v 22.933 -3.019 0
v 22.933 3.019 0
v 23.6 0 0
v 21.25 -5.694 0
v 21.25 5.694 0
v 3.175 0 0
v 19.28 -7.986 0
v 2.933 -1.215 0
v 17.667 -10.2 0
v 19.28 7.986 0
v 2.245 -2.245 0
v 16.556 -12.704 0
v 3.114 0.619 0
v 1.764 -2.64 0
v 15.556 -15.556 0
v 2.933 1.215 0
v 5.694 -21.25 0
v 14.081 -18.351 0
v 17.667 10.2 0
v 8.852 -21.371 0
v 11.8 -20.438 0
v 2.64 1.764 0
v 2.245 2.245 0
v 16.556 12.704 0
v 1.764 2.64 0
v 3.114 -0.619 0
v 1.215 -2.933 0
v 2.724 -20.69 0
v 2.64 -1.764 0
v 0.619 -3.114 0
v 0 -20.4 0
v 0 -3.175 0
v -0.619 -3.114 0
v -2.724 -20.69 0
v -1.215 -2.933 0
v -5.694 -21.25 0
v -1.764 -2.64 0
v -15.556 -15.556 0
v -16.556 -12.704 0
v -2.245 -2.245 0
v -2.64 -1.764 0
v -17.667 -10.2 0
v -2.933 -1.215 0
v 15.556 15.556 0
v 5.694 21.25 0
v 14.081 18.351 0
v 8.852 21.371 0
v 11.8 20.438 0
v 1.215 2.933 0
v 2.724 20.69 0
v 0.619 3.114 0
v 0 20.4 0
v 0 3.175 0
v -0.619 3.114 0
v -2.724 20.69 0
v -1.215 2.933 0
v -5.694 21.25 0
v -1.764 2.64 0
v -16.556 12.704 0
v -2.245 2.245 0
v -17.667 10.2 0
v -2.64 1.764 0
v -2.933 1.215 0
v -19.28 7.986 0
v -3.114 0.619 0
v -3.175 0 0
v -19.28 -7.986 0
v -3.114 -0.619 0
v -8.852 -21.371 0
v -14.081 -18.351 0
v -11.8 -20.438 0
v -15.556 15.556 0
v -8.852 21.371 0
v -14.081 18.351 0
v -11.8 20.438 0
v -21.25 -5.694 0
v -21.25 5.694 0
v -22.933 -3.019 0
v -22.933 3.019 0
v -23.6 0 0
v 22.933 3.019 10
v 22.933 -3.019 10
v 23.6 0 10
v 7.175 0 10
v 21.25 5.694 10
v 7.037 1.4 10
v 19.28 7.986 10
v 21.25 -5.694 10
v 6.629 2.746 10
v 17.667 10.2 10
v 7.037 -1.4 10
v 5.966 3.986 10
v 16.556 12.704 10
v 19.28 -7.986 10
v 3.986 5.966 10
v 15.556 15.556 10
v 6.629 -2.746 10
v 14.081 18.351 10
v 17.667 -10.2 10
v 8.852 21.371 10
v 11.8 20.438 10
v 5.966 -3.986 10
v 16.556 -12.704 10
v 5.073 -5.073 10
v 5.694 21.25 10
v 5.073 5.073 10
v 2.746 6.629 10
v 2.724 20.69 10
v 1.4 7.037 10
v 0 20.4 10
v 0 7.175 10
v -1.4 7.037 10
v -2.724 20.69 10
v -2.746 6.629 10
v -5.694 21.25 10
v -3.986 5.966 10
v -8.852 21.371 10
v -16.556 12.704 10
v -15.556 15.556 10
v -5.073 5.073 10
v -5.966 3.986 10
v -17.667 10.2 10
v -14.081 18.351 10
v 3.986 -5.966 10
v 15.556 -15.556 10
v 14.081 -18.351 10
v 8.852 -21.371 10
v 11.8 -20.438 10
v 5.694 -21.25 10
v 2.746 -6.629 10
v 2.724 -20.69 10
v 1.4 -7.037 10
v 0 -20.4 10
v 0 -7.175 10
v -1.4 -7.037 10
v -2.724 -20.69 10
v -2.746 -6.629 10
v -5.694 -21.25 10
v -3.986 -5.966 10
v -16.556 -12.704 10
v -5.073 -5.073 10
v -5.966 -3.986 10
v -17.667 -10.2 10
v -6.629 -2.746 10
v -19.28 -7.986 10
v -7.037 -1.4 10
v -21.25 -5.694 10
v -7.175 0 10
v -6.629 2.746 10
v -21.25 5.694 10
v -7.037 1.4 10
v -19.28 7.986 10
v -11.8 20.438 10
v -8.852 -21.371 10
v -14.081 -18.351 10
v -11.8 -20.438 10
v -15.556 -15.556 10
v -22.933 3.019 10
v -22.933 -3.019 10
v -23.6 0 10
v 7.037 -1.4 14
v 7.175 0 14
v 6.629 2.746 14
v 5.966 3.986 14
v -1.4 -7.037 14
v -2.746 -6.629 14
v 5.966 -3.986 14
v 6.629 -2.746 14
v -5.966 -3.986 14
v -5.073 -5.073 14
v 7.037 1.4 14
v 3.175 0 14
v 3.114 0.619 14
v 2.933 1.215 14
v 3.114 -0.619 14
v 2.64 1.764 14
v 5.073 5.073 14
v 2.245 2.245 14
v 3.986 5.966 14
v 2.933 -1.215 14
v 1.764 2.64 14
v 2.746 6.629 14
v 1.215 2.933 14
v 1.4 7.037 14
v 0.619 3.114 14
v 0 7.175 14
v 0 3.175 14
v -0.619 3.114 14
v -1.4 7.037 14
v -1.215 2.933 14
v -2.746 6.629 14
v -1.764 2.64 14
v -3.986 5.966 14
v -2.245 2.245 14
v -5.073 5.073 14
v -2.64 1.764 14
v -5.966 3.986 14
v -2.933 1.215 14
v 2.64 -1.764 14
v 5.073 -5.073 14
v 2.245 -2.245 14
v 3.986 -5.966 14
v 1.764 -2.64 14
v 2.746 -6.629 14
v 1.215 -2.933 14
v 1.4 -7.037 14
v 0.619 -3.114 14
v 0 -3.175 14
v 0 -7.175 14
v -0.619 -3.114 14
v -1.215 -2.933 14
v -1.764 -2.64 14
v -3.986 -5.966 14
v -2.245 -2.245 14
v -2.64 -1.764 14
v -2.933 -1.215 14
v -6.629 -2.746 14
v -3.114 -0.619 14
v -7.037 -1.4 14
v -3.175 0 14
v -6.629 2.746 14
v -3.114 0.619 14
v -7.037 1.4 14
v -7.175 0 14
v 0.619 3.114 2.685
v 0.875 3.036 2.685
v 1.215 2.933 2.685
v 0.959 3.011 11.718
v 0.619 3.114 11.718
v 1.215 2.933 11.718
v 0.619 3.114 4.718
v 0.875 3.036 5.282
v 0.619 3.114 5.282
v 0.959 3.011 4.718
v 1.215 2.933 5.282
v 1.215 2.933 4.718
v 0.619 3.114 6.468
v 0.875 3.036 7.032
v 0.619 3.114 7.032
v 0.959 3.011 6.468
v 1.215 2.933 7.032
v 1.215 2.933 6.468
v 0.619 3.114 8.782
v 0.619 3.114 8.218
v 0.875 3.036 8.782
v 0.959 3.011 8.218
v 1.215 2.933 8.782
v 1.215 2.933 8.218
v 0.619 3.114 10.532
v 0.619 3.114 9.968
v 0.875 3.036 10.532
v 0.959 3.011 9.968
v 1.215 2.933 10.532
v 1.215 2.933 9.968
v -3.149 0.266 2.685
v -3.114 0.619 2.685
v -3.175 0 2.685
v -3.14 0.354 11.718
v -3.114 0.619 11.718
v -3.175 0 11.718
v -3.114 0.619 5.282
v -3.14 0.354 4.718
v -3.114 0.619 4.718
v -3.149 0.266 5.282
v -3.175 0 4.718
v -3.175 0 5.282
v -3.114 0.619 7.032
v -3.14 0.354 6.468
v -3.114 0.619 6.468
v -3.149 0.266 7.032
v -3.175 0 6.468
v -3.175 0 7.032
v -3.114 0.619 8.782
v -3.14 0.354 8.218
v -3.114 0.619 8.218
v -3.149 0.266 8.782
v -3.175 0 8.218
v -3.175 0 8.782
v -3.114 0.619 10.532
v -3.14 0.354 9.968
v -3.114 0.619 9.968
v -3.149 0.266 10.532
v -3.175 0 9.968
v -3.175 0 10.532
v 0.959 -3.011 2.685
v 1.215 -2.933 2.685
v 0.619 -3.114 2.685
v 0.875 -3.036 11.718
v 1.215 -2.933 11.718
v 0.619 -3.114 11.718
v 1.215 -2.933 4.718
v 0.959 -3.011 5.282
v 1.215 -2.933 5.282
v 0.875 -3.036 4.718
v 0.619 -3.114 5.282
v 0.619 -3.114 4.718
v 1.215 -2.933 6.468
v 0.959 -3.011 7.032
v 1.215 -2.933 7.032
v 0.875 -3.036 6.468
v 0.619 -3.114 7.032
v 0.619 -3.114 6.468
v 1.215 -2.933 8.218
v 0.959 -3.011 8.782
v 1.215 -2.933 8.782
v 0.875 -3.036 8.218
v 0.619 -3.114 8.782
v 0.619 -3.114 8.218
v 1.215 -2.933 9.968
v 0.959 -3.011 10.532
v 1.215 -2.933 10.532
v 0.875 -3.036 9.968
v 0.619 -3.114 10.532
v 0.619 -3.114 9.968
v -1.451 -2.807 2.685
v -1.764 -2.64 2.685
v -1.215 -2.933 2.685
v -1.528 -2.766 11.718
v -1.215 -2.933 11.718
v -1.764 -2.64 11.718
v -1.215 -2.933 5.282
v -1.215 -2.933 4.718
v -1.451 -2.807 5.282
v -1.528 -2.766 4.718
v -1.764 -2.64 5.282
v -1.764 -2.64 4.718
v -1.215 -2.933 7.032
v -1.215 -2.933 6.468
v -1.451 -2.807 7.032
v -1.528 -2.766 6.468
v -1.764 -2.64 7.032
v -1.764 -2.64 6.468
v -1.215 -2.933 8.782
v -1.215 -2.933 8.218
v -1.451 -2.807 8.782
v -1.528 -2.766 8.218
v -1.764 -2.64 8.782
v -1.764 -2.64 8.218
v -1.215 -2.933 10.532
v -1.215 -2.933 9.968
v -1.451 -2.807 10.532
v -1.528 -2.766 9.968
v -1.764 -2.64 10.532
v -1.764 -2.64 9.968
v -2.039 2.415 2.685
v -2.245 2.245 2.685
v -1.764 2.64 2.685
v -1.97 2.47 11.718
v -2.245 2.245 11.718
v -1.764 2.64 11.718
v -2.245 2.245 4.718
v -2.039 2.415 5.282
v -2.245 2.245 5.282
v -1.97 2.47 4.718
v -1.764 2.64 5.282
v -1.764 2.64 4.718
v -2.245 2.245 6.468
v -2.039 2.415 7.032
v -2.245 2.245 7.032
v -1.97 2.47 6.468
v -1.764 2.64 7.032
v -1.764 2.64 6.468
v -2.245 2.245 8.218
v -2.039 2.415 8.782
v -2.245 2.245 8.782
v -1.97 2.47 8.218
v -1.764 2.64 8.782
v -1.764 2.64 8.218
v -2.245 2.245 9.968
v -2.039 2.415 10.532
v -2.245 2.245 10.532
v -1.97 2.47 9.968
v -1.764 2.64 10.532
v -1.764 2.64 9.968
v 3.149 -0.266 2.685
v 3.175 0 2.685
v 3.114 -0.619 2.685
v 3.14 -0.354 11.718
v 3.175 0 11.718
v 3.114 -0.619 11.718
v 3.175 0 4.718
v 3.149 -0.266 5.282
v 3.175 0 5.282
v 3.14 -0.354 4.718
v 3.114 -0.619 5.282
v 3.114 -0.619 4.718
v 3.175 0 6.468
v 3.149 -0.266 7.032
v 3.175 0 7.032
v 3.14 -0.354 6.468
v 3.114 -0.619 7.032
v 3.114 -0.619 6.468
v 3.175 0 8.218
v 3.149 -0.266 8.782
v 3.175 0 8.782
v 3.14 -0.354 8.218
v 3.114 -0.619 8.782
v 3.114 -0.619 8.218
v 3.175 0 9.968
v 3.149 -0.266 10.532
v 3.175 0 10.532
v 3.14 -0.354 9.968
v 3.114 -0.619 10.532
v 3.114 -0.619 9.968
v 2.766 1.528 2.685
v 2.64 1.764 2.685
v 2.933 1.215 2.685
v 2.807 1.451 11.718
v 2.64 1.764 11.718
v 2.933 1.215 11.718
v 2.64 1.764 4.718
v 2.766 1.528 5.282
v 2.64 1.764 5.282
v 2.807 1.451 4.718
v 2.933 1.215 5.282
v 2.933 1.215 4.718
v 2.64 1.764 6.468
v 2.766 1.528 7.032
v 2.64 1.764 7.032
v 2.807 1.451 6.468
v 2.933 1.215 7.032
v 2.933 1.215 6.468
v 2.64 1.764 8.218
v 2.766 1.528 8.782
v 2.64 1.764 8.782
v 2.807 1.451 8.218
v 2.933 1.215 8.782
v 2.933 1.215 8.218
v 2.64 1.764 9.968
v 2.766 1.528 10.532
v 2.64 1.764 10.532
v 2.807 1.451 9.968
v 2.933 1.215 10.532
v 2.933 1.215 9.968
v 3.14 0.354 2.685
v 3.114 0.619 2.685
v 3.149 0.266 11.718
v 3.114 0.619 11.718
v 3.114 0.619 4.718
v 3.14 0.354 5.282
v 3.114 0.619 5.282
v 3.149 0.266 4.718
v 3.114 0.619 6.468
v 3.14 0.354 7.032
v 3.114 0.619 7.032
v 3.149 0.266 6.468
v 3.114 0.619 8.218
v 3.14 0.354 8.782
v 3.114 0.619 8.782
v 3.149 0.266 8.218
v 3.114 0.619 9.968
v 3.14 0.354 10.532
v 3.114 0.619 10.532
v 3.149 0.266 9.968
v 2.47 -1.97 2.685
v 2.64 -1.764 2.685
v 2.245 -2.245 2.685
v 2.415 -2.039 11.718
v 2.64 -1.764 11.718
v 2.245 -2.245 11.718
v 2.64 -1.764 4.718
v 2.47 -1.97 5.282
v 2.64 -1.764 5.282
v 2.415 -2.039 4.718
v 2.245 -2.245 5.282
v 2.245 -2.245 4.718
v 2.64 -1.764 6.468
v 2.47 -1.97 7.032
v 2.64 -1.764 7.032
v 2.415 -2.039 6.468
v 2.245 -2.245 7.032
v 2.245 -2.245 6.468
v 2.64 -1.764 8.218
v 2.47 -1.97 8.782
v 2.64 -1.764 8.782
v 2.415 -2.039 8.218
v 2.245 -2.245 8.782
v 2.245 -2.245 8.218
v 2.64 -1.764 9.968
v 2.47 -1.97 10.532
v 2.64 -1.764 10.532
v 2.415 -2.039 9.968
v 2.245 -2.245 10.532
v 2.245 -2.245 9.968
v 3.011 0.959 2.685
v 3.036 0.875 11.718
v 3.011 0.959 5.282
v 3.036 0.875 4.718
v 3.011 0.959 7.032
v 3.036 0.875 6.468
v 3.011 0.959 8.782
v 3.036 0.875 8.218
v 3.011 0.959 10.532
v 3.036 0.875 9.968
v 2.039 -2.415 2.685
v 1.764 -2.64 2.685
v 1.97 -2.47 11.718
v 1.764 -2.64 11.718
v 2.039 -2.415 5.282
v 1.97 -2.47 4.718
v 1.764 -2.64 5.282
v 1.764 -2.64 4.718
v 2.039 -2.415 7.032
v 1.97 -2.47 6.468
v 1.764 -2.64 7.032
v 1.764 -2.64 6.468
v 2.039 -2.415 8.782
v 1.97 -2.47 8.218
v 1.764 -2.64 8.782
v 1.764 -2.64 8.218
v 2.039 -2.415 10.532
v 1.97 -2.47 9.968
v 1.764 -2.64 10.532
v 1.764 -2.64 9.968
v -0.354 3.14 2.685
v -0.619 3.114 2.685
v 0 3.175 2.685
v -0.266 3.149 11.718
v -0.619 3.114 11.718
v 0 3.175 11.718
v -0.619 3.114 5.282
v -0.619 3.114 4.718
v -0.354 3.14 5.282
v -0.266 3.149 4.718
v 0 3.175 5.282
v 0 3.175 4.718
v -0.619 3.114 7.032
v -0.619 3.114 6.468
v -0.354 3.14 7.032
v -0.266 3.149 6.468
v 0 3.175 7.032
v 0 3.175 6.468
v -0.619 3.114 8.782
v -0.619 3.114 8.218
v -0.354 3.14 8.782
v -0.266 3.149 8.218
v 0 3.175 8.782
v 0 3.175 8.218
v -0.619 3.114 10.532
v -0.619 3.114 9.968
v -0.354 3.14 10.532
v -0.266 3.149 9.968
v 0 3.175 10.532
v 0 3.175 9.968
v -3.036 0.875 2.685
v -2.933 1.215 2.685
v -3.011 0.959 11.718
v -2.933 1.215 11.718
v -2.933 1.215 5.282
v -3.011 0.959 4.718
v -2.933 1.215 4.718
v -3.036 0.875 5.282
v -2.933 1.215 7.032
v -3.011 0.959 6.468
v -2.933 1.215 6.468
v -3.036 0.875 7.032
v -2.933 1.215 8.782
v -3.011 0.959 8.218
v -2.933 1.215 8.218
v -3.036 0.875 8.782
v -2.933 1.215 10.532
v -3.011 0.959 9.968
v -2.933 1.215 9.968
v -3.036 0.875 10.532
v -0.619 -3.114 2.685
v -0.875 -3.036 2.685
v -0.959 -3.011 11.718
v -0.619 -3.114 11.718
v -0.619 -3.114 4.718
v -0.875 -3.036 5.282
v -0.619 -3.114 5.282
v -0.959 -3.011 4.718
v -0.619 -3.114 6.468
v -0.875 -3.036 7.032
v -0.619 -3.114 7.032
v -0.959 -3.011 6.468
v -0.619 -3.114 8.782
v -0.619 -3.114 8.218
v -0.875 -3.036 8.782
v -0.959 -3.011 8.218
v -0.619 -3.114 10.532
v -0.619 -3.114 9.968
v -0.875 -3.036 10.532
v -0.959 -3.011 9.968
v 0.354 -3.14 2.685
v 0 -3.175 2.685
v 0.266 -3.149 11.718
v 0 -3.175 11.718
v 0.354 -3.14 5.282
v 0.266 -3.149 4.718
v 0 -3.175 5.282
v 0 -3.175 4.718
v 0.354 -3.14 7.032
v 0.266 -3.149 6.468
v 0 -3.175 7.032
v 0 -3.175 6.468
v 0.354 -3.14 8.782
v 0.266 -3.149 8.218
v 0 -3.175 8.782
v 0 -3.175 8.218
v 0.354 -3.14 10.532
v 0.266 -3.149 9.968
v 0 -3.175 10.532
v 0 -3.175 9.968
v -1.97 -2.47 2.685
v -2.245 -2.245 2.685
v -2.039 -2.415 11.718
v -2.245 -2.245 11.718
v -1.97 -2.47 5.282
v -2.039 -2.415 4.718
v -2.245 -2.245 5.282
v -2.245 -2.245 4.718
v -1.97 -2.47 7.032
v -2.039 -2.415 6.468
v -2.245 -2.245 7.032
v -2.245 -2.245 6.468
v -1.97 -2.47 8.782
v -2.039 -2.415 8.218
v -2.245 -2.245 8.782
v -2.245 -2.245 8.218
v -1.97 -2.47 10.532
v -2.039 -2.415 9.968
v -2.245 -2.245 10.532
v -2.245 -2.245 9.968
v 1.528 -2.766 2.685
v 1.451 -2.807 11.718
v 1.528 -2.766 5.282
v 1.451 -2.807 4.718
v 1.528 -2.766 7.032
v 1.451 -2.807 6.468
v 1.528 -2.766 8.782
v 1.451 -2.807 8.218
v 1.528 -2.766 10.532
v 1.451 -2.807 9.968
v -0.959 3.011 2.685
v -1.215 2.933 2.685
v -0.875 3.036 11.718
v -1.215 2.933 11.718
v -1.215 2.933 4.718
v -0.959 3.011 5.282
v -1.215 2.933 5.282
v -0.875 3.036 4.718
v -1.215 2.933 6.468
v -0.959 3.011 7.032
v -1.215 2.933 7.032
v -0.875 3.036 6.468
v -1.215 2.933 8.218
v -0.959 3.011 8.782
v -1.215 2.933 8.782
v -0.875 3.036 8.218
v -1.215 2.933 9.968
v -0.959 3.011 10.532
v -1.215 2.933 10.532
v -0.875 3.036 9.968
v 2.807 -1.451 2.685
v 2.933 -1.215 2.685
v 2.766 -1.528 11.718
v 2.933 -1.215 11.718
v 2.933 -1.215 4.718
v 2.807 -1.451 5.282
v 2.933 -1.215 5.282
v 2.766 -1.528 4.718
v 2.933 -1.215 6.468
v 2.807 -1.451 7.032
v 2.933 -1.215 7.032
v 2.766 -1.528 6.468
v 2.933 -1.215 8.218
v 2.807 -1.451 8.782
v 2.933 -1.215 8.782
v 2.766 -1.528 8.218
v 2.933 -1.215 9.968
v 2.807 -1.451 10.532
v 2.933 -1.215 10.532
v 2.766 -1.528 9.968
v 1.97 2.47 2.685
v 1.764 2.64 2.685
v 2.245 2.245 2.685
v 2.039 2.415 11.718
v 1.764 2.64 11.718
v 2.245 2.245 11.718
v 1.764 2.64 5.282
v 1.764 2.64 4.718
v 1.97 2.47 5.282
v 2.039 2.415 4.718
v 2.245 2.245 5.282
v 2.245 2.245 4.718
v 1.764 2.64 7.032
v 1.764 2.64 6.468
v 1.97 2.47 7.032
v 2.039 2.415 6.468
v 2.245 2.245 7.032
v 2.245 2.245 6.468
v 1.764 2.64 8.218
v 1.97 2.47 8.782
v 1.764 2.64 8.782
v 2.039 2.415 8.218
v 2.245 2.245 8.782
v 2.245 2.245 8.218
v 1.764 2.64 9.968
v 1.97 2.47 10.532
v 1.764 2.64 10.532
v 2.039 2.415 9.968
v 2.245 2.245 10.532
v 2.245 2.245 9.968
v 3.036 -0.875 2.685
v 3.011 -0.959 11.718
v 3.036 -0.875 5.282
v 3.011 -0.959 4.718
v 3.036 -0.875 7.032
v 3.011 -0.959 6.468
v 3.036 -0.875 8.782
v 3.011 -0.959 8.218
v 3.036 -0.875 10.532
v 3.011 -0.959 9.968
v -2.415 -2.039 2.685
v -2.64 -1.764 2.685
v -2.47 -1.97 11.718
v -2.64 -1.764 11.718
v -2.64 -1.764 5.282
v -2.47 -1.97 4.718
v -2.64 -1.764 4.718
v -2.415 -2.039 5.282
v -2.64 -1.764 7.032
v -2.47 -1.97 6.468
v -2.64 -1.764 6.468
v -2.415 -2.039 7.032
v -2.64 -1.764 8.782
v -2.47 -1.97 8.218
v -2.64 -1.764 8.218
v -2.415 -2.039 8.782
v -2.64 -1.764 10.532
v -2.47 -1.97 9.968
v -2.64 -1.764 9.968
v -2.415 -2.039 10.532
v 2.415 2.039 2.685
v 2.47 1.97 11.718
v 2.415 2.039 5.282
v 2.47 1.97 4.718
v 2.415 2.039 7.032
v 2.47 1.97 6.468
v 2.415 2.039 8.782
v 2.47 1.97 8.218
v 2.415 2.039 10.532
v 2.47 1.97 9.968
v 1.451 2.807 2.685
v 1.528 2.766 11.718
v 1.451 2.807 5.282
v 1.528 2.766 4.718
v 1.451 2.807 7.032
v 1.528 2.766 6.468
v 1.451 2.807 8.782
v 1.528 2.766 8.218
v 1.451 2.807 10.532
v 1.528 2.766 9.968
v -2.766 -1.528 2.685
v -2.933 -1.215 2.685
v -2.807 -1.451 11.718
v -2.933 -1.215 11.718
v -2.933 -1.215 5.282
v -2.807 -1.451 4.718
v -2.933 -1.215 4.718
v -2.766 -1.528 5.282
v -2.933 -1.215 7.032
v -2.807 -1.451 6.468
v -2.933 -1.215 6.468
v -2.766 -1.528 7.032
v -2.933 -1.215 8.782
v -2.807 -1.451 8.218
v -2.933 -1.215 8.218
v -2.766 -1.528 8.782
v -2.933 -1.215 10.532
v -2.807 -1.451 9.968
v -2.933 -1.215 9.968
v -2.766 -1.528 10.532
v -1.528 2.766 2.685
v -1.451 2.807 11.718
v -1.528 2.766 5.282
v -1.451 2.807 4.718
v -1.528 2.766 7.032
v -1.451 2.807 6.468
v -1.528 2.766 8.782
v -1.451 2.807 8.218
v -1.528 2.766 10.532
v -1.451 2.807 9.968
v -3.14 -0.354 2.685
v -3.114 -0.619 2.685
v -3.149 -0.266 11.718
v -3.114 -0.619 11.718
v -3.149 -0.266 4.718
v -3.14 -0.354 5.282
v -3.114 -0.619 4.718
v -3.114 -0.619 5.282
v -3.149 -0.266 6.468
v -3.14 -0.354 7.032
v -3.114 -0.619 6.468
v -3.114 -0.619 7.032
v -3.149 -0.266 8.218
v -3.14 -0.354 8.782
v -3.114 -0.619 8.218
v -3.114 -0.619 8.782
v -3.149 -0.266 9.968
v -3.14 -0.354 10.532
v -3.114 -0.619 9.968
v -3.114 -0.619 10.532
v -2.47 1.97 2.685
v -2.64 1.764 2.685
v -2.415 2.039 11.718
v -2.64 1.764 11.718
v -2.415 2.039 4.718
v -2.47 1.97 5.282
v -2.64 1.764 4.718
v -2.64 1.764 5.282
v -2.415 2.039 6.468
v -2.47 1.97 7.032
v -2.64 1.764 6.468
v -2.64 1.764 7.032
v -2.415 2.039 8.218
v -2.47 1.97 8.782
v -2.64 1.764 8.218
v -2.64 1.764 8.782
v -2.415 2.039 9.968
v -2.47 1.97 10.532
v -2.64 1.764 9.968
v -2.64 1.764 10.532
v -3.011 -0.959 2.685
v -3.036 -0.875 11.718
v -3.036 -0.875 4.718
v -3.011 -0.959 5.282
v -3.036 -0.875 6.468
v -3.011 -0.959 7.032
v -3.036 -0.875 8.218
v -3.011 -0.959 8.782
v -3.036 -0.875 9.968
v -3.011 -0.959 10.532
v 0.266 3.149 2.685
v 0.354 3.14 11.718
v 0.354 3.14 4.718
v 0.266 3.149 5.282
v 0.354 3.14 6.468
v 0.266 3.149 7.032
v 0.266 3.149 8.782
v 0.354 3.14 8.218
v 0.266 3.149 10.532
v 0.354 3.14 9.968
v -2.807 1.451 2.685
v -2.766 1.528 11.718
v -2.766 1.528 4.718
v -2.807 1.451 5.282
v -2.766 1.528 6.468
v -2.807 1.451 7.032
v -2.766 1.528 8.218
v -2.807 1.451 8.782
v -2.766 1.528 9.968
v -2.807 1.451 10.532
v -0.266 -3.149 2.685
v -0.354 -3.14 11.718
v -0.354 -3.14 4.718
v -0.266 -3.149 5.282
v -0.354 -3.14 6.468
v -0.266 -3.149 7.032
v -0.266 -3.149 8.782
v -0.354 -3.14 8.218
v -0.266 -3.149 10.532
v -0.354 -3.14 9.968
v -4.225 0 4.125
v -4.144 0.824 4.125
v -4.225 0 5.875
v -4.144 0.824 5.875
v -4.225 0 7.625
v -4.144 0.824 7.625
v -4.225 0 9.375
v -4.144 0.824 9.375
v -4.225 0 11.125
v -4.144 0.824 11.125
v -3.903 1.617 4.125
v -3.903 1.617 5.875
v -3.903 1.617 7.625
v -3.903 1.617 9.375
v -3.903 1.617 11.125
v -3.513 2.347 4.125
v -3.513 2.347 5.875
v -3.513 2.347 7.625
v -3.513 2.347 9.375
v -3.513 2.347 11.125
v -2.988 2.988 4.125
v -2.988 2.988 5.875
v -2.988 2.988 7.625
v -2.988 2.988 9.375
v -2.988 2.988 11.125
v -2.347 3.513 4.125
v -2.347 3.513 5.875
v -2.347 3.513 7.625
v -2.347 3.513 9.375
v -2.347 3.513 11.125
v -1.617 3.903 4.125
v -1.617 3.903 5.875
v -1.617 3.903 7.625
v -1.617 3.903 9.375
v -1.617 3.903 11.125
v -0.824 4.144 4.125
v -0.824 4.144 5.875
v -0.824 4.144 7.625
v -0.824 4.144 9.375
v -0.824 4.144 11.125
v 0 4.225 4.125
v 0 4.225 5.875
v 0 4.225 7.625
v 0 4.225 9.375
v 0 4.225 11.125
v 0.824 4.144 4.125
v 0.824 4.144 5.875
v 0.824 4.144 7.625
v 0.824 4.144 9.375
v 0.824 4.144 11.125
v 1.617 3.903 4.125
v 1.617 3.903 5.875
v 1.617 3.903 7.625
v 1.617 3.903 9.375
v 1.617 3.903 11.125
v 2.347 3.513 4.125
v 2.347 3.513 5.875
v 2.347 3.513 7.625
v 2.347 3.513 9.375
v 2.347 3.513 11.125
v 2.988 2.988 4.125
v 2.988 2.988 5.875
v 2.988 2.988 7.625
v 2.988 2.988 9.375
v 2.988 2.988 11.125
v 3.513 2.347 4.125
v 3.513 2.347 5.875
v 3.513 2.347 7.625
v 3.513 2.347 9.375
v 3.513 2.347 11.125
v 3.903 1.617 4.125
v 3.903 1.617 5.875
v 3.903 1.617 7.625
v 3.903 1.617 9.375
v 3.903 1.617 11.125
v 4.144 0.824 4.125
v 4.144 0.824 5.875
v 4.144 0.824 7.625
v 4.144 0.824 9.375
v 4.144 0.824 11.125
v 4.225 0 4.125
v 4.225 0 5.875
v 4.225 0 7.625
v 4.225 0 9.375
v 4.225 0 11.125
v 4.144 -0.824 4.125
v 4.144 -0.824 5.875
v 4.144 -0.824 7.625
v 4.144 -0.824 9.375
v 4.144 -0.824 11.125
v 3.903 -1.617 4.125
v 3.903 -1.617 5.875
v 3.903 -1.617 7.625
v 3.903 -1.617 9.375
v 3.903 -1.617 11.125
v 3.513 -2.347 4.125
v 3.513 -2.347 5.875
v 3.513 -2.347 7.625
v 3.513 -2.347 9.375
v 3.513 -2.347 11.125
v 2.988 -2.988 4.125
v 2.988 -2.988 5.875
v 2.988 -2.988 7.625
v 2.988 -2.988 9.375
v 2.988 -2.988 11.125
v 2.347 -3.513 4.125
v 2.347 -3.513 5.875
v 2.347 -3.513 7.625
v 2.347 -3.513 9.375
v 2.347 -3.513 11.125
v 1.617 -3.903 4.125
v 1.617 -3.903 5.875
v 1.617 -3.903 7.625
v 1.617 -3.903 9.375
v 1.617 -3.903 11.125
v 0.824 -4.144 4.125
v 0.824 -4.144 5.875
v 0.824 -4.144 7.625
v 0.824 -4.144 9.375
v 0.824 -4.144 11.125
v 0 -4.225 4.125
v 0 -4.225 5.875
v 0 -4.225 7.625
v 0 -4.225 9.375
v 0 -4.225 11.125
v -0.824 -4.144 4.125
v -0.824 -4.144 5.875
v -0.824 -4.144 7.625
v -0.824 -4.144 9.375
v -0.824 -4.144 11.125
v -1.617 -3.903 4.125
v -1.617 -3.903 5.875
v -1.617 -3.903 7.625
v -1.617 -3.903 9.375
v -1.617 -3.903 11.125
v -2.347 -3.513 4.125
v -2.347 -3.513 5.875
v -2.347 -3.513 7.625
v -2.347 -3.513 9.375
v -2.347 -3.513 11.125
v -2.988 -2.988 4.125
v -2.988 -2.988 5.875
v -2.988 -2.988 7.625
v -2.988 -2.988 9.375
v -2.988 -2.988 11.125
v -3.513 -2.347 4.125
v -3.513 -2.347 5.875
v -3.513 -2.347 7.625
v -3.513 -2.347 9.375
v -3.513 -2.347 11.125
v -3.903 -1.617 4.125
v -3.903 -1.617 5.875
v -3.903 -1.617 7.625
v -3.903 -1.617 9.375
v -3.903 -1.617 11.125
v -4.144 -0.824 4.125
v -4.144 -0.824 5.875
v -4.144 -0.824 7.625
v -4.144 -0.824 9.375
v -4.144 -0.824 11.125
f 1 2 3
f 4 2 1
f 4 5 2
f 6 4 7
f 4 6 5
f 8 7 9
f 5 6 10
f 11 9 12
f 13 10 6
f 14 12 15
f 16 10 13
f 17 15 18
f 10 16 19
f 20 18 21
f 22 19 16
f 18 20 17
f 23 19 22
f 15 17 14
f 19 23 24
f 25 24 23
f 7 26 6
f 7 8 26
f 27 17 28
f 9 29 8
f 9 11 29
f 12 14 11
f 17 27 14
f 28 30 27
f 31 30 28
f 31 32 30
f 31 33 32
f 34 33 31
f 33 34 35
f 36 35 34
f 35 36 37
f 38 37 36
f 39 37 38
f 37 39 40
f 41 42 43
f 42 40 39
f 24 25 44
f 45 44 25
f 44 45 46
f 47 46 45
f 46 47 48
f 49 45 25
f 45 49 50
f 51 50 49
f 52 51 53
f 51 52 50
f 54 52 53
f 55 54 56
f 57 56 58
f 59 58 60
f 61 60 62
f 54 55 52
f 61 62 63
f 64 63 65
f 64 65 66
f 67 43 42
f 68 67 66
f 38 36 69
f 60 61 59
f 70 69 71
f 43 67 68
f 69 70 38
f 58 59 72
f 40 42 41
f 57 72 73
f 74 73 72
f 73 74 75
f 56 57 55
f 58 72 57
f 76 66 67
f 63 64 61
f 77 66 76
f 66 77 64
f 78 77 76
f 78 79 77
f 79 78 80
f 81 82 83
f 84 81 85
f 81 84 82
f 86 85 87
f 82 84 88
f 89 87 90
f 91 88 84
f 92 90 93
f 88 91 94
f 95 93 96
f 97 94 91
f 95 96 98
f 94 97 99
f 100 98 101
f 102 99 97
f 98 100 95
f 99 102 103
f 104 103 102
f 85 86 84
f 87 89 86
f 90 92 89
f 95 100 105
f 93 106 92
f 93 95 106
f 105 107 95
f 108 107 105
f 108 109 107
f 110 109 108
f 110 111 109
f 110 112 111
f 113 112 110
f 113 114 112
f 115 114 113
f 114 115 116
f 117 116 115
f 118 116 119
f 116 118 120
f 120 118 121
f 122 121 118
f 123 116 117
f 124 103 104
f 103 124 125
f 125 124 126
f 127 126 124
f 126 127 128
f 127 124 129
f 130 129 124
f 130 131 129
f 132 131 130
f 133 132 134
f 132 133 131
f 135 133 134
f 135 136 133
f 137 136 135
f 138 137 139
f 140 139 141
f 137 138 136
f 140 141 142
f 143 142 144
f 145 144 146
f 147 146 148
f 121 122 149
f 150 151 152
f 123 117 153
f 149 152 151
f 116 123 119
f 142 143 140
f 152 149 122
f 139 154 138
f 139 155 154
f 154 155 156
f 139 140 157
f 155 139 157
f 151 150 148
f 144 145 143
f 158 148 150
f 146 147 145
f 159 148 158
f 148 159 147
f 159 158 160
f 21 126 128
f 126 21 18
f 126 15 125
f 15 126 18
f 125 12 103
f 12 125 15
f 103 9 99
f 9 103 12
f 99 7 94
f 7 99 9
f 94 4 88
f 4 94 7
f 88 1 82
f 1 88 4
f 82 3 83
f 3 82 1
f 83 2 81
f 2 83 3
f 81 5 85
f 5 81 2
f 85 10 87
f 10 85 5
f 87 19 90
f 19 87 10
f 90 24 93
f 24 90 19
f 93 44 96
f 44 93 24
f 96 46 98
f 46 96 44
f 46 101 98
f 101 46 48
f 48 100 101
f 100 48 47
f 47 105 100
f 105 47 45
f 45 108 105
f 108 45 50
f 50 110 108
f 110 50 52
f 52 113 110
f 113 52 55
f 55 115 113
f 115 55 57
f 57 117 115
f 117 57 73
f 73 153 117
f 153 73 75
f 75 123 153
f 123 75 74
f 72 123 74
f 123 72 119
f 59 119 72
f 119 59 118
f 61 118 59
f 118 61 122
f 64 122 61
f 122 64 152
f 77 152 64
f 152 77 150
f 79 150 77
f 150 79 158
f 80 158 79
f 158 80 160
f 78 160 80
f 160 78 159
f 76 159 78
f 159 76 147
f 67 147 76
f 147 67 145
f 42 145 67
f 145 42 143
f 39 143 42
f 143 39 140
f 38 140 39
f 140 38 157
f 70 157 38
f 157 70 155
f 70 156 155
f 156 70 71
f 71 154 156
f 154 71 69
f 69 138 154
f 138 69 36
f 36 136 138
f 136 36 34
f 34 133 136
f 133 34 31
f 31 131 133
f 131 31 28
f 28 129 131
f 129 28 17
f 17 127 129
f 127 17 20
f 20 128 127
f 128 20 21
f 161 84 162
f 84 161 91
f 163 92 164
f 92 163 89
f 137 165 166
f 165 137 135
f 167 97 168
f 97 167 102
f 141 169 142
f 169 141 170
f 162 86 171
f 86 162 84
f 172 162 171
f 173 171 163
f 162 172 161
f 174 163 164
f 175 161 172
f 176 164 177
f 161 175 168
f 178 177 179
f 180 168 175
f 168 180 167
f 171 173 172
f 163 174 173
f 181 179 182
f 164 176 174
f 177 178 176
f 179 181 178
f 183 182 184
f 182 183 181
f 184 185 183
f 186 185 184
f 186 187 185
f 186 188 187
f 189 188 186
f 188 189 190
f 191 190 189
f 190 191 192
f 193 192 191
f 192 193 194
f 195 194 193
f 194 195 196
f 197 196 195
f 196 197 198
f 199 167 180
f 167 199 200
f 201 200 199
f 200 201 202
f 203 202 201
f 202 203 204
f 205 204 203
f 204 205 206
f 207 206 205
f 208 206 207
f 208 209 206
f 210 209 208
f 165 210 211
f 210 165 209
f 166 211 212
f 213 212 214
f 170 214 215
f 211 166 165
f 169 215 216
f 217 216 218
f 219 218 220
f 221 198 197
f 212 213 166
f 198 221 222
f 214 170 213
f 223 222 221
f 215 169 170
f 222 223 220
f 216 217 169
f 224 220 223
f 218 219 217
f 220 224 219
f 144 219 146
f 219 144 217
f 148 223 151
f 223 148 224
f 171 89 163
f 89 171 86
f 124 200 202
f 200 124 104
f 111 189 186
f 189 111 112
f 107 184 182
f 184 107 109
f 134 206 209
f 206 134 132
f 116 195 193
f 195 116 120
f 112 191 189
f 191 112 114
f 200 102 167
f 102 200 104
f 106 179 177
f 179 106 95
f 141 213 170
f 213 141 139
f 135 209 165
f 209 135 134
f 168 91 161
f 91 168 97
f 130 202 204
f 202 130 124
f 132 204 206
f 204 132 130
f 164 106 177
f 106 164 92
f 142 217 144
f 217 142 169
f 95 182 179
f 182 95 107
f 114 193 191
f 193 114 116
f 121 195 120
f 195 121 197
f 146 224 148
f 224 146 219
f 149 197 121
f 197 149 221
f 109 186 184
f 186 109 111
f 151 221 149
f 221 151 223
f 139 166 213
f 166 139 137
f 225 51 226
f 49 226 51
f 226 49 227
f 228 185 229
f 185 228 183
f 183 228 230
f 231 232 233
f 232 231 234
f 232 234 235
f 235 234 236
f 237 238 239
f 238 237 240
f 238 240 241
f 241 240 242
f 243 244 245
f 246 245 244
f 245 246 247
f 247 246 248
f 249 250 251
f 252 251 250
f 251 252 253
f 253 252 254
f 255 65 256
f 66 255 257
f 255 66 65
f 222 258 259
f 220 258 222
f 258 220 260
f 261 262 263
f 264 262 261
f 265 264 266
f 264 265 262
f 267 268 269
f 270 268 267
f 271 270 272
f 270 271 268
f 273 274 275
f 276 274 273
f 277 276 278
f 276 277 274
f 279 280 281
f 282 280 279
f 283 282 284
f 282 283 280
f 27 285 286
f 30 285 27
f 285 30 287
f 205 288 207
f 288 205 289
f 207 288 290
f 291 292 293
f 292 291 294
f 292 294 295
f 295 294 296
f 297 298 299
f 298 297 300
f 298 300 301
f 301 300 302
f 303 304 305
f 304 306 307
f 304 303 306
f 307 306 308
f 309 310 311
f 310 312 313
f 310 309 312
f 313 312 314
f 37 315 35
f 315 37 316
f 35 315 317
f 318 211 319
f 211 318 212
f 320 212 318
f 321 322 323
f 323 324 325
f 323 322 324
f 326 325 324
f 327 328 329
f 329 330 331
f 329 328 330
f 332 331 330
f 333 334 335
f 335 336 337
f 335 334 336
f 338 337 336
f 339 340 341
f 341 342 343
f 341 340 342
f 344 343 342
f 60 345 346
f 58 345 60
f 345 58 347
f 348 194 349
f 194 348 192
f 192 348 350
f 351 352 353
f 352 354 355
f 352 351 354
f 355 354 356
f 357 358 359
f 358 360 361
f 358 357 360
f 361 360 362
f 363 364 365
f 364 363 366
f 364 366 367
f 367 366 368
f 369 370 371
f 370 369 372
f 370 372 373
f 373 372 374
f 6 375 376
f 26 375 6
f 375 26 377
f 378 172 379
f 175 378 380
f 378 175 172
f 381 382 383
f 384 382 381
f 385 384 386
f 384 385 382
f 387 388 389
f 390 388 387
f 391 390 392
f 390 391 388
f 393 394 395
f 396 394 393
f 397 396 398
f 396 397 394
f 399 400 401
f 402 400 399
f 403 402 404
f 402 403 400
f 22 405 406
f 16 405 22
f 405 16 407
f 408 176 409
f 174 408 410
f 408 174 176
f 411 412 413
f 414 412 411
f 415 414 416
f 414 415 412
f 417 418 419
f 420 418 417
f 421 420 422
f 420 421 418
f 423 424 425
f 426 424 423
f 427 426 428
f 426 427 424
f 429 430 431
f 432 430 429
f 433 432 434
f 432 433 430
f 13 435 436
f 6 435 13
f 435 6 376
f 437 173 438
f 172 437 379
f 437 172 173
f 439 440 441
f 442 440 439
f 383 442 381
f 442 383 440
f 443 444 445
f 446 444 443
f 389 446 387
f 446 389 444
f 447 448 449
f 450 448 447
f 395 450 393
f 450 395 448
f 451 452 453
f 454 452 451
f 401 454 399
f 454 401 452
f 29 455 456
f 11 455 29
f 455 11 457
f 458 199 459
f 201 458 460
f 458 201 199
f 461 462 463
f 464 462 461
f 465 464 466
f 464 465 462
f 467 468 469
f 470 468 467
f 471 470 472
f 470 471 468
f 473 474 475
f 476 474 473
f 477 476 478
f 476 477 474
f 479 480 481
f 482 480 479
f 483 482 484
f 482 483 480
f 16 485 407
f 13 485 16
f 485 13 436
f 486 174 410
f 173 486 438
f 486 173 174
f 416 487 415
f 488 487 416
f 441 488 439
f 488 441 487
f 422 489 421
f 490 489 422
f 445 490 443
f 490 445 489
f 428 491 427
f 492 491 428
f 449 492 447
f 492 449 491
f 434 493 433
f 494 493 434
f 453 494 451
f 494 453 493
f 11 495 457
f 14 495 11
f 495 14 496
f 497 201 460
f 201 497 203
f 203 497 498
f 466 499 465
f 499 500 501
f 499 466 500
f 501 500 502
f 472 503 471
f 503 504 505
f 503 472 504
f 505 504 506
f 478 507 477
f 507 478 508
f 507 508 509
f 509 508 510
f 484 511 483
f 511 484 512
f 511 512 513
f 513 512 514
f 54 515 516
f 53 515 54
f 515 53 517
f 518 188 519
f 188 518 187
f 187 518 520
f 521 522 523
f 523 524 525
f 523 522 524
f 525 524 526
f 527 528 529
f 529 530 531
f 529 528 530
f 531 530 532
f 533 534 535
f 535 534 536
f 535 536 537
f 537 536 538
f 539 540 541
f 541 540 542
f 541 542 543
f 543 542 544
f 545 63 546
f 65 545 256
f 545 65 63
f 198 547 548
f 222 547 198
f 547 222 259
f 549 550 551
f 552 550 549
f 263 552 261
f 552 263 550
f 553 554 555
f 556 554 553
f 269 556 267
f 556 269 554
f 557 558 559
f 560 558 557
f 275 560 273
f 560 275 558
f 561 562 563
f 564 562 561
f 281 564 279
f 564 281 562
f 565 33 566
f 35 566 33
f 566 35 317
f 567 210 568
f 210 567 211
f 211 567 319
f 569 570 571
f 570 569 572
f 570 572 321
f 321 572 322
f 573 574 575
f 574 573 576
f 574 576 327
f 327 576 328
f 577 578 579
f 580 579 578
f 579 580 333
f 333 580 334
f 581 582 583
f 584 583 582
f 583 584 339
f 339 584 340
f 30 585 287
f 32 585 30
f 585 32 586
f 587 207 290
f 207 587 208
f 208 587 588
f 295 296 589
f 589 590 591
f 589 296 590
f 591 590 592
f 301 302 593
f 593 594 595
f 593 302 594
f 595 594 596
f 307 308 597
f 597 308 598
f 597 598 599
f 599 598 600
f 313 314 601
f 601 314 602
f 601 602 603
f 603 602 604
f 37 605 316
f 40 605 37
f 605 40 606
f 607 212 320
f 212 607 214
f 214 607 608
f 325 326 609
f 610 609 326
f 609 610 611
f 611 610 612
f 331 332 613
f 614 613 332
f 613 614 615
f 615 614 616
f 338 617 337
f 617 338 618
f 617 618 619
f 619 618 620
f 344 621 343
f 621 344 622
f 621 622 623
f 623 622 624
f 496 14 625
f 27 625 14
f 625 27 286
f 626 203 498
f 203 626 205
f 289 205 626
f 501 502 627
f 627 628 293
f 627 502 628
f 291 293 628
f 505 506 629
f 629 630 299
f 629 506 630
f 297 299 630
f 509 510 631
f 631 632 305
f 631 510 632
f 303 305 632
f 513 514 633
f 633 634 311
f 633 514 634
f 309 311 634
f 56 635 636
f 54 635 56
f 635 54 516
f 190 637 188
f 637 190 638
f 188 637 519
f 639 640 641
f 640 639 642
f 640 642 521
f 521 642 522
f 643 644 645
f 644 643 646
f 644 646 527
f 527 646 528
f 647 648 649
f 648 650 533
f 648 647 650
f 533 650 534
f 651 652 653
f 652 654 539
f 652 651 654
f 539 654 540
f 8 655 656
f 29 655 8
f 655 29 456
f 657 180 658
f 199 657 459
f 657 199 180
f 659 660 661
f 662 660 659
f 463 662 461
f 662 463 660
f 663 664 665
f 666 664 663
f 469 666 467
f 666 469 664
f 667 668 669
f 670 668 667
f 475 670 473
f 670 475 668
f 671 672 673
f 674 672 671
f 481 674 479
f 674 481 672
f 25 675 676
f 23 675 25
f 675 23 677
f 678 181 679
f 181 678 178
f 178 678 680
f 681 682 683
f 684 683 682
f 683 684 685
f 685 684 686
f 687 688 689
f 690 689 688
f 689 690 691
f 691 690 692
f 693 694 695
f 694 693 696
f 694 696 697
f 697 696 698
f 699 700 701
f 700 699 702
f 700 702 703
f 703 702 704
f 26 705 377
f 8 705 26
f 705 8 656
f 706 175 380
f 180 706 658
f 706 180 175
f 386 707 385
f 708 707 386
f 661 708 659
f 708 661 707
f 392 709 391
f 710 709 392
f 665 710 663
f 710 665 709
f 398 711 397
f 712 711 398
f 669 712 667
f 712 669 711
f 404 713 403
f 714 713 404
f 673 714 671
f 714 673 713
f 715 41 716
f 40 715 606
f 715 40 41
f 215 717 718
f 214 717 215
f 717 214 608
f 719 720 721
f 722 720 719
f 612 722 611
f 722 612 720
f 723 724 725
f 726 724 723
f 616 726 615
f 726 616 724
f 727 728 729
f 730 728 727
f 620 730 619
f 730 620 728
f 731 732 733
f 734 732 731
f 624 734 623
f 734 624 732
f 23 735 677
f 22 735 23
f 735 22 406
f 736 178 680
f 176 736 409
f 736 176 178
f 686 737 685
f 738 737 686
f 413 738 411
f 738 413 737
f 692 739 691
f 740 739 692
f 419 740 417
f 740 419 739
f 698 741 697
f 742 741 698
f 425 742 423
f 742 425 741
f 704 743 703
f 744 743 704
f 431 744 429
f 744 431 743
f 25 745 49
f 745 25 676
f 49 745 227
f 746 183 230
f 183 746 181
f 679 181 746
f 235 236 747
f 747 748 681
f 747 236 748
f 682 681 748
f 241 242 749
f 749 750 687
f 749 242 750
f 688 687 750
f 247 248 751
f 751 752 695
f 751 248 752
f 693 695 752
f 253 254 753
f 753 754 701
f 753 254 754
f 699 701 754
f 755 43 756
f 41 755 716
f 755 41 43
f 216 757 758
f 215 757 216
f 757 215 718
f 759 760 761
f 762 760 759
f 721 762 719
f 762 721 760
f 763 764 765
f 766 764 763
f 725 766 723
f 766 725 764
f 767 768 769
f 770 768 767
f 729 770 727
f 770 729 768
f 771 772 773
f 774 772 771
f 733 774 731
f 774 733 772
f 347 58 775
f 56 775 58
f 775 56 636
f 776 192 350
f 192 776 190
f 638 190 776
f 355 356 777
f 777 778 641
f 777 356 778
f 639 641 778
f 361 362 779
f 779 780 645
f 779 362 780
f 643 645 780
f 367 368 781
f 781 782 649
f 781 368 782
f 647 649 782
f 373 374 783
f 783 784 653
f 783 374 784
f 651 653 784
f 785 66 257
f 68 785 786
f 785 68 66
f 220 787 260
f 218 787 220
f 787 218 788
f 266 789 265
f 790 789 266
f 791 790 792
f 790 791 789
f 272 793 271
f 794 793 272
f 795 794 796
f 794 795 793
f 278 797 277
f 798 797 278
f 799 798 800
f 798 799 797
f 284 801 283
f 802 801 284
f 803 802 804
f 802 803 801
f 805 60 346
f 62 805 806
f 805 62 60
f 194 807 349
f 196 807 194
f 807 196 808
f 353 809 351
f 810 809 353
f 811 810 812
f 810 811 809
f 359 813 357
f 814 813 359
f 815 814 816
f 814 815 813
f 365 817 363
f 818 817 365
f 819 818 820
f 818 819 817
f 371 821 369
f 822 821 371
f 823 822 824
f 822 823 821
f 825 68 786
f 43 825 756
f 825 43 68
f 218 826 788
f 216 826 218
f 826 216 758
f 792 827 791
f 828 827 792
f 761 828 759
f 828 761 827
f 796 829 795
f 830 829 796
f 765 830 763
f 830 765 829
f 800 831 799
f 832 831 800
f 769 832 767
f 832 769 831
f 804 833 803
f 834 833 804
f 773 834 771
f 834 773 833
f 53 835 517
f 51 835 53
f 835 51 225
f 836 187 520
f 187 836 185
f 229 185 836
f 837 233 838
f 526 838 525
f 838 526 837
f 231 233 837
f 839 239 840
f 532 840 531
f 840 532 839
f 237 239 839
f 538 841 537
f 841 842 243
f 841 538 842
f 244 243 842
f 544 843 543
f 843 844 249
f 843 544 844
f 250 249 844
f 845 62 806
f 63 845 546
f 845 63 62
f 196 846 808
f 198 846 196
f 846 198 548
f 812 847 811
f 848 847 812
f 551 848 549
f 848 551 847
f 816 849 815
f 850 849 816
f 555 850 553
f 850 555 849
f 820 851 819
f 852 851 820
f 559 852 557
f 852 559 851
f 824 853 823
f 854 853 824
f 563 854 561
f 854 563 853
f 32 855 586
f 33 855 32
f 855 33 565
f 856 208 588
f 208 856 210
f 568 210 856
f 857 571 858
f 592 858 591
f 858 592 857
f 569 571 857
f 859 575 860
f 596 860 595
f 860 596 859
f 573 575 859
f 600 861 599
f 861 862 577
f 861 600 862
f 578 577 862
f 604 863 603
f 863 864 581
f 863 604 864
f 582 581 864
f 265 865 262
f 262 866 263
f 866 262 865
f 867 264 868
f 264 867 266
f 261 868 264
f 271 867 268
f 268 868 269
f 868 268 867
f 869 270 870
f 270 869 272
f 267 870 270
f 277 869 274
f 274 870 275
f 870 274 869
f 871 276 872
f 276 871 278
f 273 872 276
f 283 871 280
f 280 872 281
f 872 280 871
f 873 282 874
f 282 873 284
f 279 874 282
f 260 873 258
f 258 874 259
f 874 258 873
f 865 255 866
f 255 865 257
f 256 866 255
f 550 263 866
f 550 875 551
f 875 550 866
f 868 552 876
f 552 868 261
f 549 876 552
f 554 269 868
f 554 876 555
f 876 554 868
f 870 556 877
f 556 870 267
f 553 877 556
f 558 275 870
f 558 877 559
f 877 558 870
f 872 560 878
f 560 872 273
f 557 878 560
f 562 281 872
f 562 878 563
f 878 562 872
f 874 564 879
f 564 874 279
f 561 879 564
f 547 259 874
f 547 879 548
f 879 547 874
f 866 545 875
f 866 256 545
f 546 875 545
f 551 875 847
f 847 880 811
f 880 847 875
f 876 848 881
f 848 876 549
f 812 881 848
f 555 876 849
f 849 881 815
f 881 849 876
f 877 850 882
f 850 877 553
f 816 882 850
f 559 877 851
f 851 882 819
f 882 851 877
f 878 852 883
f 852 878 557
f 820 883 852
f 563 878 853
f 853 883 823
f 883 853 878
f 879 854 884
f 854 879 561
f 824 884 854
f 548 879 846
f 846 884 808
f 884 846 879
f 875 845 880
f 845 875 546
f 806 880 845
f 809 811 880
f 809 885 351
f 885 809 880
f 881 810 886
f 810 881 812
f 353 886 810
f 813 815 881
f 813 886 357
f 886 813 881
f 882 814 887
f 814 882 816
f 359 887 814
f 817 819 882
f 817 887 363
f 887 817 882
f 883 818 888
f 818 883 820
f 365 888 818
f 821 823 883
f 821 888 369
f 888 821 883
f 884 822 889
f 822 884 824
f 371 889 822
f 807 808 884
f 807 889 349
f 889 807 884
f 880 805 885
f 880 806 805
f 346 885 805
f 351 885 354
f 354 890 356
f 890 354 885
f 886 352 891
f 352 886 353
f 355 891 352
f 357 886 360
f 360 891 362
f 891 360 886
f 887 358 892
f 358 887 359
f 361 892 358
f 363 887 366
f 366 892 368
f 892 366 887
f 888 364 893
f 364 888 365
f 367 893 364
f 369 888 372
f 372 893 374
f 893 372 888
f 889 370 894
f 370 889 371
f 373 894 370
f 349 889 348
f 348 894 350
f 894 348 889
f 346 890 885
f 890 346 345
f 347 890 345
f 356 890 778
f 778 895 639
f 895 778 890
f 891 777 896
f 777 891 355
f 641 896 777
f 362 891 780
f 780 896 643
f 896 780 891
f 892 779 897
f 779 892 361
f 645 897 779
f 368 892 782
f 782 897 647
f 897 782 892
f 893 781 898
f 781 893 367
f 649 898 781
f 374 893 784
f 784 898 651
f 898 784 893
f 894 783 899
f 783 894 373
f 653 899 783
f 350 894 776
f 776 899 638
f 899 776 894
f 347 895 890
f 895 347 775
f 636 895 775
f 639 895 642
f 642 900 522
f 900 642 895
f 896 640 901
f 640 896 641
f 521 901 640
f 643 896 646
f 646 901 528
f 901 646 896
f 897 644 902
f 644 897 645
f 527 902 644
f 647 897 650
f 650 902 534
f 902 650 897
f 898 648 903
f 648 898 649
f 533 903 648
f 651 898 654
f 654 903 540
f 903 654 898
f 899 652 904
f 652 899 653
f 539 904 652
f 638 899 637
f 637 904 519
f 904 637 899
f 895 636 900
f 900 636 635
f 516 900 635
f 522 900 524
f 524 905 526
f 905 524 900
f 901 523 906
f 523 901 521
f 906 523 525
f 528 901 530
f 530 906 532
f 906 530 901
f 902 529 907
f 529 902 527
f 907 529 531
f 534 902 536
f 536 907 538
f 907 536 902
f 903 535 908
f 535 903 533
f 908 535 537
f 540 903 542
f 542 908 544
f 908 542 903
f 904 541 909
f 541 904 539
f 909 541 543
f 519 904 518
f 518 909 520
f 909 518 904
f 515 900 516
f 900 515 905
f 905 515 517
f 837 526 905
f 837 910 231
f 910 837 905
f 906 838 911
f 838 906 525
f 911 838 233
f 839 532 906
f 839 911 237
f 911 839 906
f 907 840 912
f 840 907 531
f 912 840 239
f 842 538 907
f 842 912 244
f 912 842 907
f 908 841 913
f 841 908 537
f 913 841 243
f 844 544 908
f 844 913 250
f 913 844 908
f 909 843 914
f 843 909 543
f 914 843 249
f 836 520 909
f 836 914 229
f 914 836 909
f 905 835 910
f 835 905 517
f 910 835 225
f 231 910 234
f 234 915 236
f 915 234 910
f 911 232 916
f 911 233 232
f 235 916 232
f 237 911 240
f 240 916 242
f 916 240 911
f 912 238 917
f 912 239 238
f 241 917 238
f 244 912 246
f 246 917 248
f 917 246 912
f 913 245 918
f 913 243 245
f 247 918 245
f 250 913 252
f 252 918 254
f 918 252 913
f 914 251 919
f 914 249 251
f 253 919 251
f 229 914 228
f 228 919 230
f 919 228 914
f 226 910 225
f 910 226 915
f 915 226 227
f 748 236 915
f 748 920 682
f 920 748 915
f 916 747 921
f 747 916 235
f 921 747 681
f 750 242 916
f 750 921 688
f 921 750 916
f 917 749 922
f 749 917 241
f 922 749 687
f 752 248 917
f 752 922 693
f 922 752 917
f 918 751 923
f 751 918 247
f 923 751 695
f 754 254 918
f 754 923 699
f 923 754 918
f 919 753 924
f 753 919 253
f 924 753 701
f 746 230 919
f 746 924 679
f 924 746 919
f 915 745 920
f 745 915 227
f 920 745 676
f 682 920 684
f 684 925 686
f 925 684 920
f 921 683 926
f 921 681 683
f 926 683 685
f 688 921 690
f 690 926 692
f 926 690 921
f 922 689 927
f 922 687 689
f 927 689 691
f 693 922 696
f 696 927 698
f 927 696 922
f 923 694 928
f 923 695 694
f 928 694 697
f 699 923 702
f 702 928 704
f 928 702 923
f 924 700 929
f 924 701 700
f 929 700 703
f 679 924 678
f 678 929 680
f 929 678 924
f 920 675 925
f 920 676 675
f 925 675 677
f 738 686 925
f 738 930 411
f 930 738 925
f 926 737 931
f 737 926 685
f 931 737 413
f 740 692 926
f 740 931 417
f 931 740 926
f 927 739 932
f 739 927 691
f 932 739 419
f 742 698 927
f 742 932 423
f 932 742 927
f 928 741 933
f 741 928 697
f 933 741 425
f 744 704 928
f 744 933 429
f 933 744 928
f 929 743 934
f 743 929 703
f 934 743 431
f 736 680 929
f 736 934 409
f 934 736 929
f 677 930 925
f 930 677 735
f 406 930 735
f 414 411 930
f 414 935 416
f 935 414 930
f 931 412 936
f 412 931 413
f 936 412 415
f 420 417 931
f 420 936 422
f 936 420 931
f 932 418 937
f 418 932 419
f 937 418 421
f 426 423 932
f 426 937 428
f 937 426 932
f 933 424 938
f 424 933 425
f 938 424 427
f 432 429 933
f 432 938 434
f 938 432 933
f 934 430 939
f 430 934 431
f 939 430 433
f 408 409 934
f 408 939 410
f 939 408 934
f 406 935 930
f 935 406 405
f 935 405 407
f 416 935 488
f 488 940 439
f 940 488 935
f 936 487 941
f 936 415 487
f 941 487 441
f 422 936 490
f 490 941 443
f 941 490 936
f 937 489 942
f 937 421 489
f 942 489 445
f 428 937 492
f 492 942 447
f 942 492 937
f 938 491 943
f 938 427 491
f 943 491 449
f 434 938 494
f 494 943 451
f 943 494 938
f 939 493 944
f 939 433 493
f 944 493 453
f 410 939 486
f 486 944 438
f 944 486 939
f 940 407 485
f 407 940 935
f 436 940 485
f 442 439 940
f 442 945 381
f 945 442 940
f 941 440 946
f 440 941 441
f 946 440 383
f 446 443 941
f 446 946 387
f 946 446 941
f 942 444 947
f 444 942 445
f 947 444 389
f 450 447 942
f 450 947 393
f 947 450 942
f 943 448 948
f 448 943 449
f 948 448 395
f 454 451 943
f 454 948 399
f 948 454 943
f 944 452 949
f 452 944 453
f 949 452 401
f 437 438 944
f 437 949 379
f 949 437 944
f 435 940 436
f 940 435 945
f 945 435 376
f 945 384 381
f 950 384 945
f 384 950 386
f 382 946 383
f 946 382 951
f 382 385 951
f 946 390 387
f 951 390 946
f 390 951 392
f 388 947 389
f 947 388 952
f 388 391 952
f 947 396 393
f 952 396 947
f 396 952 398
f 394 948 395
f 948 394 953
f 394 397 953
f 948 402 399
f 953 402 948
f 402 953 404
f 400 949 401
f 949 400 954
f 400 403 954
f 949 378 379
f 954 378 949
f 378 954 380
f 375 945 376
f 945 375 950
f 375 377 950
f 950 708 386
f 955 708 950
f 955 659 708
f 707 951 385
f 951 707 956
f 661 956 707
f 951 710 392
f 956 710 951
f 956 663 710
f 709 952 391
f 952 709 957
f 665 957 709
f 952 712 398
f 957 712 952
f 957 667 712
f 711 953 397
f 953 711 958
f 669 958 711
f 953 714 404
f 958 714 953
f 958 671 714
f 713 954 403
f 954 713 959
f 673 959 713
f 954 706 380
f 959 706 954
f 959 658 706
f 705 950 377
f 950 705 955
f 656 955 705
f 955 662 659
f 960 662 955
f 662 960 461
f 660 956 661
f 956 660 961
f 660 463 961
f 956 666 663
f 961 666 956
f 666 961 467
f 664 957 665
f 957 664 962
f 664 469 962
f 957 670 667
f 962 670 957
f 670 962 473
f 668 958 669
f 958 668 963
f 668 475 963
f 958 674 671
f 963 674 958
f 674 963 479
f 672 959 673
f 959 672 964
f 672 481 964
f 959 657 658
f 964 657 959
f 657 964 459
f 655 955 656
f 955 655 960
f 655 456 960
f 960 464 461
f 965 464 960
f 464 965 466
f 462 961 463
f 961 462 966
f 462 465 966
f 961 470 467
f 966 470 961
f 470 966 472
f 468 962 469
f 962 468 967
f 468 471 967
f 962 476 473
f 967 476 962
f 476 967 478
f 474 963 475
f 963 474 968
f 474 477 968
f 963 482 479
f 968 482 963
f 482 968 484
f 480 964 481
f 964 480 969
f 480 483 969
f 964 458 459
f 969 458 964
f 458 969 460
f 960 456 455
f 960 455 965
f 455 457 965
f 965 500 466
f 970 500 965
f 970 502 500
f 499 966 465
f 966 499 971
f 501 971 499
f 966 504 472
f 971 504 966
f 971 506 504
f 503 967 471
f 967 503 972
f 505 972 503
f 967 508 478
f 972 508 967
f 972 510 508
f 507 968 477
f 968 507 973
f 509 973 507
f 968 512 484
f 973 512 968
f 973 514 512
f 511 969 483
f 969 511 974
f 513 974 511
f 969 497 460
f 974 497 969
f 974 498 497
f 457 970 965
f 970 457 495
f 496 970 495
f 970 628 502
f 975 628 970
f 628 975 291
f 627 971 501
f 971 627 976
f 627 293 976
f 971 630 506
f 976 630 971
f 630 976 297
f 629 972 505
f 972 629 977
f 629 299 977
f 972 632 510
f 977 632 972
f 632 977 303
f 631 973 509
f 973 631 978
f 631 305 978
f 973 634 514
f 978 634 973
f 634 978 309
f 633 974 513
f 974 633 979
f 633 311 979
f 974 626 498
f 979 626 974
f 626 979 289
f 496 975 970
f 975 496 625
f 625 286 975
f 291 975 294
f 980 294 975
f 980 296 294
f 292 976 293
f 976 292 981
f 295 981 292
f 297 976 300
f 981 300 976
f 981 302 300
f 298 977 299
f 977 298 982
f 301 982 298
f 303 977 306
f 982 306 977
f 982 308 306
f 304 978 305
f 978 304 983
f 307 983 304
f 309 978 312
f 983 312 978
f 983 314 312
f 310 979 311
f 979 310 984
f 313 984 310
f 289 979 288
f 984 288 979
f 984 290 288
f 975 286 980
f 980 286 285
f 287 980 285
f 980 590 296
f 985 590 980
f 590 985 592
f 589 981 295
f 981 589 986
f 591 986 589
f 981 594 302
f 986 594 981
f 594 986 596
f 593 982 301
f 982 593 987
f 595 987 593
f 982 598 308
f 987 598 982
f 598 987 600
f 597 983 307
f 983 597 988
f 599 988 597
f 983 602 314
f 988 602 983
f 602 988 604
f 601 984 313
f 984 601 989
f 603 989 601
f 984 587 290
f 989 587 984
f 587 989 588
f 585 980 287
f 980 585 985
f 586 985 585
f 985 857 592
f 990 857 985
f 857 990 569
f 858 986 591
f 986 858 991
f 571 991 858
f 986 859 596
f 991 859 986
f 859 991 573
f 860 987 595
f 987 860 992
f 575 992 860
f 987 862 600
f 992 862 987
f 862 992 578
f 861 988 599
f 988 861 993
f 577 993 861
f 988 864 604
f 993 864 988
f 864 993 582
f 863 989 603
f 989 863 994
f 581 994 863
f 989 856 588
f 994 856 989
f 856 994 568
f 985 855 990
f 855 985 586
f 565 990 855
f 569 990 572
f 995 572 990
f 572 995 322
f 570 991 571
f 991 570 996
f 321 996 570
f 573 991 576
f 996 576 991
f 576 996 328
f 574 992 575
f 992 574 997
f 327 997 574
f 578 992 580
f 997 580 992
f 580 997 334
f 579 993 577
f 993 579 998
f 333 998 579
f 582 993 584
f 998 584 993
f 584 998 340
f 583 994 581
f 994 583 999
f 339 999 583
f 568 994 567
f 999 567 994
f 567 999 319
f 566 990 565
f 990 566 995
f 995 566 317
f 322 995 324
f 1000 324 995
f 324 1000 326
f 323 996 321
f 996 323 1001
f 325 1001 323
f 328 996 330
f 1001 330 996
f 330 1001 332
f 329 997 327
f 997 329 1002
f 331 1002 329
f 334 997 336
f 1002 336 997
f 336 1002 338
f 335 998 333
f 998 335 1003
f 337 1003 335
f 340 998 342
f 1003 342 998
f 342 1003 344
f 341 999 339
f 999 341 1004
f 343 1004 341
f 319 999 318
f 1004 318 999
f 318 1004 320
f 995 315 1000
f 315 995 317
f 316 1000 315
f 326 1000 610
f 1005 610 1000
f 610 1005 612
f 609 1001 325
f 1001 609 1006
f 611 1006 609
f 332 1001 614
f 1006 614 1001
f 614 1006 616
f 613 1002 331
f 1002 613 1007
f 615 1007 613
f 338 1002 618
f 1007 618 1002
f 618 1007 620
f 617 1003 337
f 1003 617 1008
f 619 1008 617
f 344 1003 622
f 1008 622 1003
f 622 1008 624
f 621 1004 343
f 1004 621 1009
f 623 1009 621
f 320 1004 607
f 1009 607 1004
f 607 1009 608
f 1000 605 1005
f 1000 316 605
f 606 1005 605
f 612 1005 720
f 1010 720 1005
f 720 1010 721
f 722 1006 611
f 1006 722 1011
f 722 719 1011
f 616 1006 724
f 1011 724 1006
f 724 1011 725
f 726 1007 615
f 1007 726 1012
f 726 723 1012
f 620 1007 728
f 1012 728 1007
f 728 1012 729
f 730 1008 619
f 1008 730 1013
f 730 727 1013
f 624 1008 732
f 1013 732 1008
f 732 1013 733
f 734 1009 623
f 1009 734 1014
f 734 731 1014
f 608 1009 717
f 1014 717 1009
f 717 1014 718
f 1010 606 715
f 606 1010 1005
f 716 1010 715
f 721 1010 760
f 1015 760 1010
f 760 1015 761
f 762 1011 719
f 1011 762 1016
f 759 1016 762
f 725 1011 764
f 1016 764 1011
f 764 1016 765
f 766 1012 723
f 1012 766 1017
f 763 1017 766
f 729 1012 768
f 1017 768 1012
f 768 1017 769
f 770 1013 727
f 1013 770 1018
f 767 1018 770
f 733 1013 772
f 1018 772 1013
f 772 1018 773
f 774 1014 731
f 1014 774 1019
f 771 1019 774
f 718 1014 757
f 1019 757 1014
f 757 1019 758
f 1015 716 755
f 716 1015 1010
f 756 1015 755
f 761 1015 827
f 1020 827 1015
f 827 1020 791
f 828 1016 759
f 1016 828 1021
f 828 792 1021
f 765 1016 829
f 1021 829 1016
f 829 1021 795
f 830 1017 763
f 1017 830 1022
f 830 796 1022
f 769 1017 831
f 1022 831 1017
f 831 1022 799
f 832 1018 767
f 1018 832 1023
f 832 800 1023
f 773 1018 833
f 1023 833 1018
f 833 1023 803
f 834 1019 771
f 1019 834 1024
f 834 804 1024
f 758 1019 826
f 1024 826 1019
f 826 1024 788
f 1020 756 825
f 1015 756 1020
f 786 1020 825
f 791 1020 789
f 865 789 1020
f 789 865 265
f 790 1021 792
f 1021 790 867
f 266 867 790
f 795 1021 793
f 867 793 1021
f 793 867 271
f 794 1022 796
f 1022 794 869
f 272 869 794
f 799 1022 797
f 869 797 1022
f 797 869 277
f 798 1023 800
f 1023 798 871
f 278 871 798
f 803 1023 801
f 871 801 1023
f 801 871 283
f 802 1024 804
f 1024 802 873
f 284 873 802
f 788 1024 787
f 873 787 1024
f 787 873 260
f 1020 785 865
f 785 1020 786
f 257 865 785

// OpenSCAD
$fn = 32;

// ----------------------------------------------------------------------
// Thumb nut: 6 lobe grip, 14 mm tall, M6.35 thread
// ----------------------------------------------------------------------

// --- parameters (mm) ---
base_r = 22;              // grip base radius
lobe_amp = 1.6;           // lobe height above the base radius
lobes = 6;                // number of grip lobes
grip_h = 10;              // grip height
boss_d = 14.35;           // threaded boss diameter
boss_h = 4;               // boss height
bore_d = 6.35;            // thread core diameter
pitch = 1.75;             // thread pitch
thread_d = 1.05;          // thread depth

grip = [[23.6, 0], [22.933, 3.019], [21.25, 5.694], [19.28, 7.986], [17.667, 10.2], [16.556, 12.704], [15.556, 15.556], [14.081, 18.351], [11.8, 20.438], [8.852, 21.371], [5.694, 21.25], [2.724, 20.69], [0, 20.4], [-2.724, 20.69], [-5.694, 21.25], [-8.852, 21.371], [-11.8, 20.438], [-14.081, 18.351], [-15.556, 15.556], [-16.556, 12.704], [-17.667, 10.2], [-19.28, 7.986], [-21.25, 5.694], [-22.933, 3.019], [-23.6, 0], [-22.933, -3.019], [-21.25, -5.694], [-19.28, -7.986], [-17.667, -10.2], [-16.556, -12.704], [-15.556, -15.556], [-14.081, -18.351], [-11.8, -20.438], [-8.852, -21.371], [-5.694, -21.25], [-2.724, -20.69], [0, -20.4], [2.724, -20.69], [5.694, -21.25], [8.852, -21.371], [11.8, -20.438], [14.081, -18.351], [15.556, -15.556], [16.556, -12.704], [17.667, -10.2], [19.28, -7.986], [21.25, -5.694], [22.933, -3.019]];

difference() {
  union() {
    /* grip outline extruded straight up */
    linear_extrude(height = grip_h) polygon(grip);
    /* boss sunk half a millimetre into the grip */
    translate([0, 0, grip_h - 0.5]) cylinder(h = boss_h + 0.5, d = boss_d);
  }
  /* threaded bore through grip and boss */
  translate([0, 0, -2.5]) cylinder(h = grip_h + boss_h + 5, d = bore_d);
  translate([0, 0, 2.0]) rotate_extrude() polygon([[2.175, 0], [2.175, 10], [2.675, 10], [4.225, 9.125], [2.675, 8.25], [4.225, 7.375], [2.675, 6.5], [4.225, 5.625], [2.675, 4.75], [4.225, 3.875], [2.675, 3], [4.225, 2.125], [2.675, 0], [2.175, 0]]);
}
